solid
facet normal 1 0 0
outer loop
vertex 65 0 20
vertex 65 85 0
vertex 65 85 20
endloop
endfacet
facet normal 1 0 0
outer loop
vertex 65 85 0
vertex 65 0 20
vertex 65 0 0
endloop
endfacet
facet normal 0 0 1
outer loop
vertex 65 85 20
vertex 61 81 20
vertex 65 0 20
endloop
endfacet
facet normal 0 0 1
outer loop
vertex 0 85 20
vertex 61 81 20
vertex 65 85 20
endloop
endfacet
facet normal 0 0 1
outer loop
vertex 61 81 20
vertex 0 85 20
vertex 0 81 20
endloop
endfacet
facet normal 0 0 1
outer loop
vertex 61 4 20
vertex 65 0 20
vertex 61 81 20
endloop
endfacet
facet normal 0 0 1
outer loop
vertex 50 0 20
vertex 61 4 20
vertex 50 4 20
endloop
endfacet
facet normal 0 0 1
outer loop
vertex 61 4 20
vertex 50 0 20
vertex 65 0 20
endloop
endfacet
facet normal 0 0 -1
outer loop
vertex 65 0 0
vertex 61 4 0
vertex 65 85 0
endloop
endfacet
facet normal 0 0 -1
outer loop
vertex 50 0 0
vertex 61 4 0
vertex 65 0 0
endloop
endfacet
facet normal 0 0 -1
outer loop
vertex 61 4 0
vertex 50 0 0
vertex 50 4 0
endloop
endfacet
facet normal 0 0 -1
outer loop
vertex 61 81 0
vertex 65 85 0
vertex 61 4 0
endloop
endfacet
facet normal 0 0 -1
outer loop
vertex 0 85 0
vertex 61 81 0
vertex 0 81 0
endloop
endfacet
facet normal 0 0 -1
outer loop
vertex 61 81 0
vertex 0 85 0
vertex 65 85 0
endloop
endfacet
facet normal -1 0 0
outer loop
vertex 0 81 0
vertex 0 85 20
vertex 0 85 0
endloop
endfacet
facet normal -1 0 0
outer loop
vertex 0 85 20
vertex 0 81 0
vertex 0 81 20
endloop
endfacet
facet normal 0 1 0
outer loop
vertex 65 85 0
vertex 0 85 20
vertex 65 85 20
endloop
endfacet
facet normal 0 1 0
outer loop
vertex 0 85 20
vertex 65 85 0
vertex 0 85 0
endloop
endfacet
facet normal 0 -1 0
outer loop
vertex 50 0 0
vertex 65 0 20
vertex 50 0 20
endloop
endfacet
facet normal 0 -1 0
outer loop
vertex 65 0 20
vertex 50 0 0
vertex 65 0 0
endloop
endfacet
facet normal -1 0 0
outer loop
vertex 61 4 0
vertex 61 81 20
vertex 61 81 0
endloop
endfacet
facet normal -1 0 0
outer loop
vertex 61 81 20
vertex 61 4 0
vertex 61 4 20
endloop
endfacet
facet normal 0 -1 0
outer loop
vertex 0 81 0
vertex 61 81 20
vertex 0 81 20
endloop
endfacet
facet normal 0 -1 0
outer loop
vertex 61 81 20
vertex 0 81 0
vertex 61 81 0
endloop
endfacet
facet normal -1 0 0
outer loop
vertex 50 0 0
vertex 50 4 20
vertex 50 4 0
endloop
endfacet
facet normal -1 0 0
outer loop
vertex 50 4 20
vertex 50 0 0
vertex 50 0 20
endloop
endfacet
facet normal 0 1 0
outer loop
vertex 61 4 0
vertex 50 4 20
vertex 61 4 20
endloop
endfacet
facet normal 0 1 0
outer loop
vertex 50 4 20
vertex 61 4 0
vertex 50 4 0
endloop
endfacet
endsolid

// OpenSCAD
t = 4;
h = 65;
l = h + 20; //36;
h2 = 15;

z = 20;

difference(){
    cube([h, l, z]);
    cube([h - t, l - t, z]);
}

translate([h - h2, 0, 0])
cube([h2, t, z]);
